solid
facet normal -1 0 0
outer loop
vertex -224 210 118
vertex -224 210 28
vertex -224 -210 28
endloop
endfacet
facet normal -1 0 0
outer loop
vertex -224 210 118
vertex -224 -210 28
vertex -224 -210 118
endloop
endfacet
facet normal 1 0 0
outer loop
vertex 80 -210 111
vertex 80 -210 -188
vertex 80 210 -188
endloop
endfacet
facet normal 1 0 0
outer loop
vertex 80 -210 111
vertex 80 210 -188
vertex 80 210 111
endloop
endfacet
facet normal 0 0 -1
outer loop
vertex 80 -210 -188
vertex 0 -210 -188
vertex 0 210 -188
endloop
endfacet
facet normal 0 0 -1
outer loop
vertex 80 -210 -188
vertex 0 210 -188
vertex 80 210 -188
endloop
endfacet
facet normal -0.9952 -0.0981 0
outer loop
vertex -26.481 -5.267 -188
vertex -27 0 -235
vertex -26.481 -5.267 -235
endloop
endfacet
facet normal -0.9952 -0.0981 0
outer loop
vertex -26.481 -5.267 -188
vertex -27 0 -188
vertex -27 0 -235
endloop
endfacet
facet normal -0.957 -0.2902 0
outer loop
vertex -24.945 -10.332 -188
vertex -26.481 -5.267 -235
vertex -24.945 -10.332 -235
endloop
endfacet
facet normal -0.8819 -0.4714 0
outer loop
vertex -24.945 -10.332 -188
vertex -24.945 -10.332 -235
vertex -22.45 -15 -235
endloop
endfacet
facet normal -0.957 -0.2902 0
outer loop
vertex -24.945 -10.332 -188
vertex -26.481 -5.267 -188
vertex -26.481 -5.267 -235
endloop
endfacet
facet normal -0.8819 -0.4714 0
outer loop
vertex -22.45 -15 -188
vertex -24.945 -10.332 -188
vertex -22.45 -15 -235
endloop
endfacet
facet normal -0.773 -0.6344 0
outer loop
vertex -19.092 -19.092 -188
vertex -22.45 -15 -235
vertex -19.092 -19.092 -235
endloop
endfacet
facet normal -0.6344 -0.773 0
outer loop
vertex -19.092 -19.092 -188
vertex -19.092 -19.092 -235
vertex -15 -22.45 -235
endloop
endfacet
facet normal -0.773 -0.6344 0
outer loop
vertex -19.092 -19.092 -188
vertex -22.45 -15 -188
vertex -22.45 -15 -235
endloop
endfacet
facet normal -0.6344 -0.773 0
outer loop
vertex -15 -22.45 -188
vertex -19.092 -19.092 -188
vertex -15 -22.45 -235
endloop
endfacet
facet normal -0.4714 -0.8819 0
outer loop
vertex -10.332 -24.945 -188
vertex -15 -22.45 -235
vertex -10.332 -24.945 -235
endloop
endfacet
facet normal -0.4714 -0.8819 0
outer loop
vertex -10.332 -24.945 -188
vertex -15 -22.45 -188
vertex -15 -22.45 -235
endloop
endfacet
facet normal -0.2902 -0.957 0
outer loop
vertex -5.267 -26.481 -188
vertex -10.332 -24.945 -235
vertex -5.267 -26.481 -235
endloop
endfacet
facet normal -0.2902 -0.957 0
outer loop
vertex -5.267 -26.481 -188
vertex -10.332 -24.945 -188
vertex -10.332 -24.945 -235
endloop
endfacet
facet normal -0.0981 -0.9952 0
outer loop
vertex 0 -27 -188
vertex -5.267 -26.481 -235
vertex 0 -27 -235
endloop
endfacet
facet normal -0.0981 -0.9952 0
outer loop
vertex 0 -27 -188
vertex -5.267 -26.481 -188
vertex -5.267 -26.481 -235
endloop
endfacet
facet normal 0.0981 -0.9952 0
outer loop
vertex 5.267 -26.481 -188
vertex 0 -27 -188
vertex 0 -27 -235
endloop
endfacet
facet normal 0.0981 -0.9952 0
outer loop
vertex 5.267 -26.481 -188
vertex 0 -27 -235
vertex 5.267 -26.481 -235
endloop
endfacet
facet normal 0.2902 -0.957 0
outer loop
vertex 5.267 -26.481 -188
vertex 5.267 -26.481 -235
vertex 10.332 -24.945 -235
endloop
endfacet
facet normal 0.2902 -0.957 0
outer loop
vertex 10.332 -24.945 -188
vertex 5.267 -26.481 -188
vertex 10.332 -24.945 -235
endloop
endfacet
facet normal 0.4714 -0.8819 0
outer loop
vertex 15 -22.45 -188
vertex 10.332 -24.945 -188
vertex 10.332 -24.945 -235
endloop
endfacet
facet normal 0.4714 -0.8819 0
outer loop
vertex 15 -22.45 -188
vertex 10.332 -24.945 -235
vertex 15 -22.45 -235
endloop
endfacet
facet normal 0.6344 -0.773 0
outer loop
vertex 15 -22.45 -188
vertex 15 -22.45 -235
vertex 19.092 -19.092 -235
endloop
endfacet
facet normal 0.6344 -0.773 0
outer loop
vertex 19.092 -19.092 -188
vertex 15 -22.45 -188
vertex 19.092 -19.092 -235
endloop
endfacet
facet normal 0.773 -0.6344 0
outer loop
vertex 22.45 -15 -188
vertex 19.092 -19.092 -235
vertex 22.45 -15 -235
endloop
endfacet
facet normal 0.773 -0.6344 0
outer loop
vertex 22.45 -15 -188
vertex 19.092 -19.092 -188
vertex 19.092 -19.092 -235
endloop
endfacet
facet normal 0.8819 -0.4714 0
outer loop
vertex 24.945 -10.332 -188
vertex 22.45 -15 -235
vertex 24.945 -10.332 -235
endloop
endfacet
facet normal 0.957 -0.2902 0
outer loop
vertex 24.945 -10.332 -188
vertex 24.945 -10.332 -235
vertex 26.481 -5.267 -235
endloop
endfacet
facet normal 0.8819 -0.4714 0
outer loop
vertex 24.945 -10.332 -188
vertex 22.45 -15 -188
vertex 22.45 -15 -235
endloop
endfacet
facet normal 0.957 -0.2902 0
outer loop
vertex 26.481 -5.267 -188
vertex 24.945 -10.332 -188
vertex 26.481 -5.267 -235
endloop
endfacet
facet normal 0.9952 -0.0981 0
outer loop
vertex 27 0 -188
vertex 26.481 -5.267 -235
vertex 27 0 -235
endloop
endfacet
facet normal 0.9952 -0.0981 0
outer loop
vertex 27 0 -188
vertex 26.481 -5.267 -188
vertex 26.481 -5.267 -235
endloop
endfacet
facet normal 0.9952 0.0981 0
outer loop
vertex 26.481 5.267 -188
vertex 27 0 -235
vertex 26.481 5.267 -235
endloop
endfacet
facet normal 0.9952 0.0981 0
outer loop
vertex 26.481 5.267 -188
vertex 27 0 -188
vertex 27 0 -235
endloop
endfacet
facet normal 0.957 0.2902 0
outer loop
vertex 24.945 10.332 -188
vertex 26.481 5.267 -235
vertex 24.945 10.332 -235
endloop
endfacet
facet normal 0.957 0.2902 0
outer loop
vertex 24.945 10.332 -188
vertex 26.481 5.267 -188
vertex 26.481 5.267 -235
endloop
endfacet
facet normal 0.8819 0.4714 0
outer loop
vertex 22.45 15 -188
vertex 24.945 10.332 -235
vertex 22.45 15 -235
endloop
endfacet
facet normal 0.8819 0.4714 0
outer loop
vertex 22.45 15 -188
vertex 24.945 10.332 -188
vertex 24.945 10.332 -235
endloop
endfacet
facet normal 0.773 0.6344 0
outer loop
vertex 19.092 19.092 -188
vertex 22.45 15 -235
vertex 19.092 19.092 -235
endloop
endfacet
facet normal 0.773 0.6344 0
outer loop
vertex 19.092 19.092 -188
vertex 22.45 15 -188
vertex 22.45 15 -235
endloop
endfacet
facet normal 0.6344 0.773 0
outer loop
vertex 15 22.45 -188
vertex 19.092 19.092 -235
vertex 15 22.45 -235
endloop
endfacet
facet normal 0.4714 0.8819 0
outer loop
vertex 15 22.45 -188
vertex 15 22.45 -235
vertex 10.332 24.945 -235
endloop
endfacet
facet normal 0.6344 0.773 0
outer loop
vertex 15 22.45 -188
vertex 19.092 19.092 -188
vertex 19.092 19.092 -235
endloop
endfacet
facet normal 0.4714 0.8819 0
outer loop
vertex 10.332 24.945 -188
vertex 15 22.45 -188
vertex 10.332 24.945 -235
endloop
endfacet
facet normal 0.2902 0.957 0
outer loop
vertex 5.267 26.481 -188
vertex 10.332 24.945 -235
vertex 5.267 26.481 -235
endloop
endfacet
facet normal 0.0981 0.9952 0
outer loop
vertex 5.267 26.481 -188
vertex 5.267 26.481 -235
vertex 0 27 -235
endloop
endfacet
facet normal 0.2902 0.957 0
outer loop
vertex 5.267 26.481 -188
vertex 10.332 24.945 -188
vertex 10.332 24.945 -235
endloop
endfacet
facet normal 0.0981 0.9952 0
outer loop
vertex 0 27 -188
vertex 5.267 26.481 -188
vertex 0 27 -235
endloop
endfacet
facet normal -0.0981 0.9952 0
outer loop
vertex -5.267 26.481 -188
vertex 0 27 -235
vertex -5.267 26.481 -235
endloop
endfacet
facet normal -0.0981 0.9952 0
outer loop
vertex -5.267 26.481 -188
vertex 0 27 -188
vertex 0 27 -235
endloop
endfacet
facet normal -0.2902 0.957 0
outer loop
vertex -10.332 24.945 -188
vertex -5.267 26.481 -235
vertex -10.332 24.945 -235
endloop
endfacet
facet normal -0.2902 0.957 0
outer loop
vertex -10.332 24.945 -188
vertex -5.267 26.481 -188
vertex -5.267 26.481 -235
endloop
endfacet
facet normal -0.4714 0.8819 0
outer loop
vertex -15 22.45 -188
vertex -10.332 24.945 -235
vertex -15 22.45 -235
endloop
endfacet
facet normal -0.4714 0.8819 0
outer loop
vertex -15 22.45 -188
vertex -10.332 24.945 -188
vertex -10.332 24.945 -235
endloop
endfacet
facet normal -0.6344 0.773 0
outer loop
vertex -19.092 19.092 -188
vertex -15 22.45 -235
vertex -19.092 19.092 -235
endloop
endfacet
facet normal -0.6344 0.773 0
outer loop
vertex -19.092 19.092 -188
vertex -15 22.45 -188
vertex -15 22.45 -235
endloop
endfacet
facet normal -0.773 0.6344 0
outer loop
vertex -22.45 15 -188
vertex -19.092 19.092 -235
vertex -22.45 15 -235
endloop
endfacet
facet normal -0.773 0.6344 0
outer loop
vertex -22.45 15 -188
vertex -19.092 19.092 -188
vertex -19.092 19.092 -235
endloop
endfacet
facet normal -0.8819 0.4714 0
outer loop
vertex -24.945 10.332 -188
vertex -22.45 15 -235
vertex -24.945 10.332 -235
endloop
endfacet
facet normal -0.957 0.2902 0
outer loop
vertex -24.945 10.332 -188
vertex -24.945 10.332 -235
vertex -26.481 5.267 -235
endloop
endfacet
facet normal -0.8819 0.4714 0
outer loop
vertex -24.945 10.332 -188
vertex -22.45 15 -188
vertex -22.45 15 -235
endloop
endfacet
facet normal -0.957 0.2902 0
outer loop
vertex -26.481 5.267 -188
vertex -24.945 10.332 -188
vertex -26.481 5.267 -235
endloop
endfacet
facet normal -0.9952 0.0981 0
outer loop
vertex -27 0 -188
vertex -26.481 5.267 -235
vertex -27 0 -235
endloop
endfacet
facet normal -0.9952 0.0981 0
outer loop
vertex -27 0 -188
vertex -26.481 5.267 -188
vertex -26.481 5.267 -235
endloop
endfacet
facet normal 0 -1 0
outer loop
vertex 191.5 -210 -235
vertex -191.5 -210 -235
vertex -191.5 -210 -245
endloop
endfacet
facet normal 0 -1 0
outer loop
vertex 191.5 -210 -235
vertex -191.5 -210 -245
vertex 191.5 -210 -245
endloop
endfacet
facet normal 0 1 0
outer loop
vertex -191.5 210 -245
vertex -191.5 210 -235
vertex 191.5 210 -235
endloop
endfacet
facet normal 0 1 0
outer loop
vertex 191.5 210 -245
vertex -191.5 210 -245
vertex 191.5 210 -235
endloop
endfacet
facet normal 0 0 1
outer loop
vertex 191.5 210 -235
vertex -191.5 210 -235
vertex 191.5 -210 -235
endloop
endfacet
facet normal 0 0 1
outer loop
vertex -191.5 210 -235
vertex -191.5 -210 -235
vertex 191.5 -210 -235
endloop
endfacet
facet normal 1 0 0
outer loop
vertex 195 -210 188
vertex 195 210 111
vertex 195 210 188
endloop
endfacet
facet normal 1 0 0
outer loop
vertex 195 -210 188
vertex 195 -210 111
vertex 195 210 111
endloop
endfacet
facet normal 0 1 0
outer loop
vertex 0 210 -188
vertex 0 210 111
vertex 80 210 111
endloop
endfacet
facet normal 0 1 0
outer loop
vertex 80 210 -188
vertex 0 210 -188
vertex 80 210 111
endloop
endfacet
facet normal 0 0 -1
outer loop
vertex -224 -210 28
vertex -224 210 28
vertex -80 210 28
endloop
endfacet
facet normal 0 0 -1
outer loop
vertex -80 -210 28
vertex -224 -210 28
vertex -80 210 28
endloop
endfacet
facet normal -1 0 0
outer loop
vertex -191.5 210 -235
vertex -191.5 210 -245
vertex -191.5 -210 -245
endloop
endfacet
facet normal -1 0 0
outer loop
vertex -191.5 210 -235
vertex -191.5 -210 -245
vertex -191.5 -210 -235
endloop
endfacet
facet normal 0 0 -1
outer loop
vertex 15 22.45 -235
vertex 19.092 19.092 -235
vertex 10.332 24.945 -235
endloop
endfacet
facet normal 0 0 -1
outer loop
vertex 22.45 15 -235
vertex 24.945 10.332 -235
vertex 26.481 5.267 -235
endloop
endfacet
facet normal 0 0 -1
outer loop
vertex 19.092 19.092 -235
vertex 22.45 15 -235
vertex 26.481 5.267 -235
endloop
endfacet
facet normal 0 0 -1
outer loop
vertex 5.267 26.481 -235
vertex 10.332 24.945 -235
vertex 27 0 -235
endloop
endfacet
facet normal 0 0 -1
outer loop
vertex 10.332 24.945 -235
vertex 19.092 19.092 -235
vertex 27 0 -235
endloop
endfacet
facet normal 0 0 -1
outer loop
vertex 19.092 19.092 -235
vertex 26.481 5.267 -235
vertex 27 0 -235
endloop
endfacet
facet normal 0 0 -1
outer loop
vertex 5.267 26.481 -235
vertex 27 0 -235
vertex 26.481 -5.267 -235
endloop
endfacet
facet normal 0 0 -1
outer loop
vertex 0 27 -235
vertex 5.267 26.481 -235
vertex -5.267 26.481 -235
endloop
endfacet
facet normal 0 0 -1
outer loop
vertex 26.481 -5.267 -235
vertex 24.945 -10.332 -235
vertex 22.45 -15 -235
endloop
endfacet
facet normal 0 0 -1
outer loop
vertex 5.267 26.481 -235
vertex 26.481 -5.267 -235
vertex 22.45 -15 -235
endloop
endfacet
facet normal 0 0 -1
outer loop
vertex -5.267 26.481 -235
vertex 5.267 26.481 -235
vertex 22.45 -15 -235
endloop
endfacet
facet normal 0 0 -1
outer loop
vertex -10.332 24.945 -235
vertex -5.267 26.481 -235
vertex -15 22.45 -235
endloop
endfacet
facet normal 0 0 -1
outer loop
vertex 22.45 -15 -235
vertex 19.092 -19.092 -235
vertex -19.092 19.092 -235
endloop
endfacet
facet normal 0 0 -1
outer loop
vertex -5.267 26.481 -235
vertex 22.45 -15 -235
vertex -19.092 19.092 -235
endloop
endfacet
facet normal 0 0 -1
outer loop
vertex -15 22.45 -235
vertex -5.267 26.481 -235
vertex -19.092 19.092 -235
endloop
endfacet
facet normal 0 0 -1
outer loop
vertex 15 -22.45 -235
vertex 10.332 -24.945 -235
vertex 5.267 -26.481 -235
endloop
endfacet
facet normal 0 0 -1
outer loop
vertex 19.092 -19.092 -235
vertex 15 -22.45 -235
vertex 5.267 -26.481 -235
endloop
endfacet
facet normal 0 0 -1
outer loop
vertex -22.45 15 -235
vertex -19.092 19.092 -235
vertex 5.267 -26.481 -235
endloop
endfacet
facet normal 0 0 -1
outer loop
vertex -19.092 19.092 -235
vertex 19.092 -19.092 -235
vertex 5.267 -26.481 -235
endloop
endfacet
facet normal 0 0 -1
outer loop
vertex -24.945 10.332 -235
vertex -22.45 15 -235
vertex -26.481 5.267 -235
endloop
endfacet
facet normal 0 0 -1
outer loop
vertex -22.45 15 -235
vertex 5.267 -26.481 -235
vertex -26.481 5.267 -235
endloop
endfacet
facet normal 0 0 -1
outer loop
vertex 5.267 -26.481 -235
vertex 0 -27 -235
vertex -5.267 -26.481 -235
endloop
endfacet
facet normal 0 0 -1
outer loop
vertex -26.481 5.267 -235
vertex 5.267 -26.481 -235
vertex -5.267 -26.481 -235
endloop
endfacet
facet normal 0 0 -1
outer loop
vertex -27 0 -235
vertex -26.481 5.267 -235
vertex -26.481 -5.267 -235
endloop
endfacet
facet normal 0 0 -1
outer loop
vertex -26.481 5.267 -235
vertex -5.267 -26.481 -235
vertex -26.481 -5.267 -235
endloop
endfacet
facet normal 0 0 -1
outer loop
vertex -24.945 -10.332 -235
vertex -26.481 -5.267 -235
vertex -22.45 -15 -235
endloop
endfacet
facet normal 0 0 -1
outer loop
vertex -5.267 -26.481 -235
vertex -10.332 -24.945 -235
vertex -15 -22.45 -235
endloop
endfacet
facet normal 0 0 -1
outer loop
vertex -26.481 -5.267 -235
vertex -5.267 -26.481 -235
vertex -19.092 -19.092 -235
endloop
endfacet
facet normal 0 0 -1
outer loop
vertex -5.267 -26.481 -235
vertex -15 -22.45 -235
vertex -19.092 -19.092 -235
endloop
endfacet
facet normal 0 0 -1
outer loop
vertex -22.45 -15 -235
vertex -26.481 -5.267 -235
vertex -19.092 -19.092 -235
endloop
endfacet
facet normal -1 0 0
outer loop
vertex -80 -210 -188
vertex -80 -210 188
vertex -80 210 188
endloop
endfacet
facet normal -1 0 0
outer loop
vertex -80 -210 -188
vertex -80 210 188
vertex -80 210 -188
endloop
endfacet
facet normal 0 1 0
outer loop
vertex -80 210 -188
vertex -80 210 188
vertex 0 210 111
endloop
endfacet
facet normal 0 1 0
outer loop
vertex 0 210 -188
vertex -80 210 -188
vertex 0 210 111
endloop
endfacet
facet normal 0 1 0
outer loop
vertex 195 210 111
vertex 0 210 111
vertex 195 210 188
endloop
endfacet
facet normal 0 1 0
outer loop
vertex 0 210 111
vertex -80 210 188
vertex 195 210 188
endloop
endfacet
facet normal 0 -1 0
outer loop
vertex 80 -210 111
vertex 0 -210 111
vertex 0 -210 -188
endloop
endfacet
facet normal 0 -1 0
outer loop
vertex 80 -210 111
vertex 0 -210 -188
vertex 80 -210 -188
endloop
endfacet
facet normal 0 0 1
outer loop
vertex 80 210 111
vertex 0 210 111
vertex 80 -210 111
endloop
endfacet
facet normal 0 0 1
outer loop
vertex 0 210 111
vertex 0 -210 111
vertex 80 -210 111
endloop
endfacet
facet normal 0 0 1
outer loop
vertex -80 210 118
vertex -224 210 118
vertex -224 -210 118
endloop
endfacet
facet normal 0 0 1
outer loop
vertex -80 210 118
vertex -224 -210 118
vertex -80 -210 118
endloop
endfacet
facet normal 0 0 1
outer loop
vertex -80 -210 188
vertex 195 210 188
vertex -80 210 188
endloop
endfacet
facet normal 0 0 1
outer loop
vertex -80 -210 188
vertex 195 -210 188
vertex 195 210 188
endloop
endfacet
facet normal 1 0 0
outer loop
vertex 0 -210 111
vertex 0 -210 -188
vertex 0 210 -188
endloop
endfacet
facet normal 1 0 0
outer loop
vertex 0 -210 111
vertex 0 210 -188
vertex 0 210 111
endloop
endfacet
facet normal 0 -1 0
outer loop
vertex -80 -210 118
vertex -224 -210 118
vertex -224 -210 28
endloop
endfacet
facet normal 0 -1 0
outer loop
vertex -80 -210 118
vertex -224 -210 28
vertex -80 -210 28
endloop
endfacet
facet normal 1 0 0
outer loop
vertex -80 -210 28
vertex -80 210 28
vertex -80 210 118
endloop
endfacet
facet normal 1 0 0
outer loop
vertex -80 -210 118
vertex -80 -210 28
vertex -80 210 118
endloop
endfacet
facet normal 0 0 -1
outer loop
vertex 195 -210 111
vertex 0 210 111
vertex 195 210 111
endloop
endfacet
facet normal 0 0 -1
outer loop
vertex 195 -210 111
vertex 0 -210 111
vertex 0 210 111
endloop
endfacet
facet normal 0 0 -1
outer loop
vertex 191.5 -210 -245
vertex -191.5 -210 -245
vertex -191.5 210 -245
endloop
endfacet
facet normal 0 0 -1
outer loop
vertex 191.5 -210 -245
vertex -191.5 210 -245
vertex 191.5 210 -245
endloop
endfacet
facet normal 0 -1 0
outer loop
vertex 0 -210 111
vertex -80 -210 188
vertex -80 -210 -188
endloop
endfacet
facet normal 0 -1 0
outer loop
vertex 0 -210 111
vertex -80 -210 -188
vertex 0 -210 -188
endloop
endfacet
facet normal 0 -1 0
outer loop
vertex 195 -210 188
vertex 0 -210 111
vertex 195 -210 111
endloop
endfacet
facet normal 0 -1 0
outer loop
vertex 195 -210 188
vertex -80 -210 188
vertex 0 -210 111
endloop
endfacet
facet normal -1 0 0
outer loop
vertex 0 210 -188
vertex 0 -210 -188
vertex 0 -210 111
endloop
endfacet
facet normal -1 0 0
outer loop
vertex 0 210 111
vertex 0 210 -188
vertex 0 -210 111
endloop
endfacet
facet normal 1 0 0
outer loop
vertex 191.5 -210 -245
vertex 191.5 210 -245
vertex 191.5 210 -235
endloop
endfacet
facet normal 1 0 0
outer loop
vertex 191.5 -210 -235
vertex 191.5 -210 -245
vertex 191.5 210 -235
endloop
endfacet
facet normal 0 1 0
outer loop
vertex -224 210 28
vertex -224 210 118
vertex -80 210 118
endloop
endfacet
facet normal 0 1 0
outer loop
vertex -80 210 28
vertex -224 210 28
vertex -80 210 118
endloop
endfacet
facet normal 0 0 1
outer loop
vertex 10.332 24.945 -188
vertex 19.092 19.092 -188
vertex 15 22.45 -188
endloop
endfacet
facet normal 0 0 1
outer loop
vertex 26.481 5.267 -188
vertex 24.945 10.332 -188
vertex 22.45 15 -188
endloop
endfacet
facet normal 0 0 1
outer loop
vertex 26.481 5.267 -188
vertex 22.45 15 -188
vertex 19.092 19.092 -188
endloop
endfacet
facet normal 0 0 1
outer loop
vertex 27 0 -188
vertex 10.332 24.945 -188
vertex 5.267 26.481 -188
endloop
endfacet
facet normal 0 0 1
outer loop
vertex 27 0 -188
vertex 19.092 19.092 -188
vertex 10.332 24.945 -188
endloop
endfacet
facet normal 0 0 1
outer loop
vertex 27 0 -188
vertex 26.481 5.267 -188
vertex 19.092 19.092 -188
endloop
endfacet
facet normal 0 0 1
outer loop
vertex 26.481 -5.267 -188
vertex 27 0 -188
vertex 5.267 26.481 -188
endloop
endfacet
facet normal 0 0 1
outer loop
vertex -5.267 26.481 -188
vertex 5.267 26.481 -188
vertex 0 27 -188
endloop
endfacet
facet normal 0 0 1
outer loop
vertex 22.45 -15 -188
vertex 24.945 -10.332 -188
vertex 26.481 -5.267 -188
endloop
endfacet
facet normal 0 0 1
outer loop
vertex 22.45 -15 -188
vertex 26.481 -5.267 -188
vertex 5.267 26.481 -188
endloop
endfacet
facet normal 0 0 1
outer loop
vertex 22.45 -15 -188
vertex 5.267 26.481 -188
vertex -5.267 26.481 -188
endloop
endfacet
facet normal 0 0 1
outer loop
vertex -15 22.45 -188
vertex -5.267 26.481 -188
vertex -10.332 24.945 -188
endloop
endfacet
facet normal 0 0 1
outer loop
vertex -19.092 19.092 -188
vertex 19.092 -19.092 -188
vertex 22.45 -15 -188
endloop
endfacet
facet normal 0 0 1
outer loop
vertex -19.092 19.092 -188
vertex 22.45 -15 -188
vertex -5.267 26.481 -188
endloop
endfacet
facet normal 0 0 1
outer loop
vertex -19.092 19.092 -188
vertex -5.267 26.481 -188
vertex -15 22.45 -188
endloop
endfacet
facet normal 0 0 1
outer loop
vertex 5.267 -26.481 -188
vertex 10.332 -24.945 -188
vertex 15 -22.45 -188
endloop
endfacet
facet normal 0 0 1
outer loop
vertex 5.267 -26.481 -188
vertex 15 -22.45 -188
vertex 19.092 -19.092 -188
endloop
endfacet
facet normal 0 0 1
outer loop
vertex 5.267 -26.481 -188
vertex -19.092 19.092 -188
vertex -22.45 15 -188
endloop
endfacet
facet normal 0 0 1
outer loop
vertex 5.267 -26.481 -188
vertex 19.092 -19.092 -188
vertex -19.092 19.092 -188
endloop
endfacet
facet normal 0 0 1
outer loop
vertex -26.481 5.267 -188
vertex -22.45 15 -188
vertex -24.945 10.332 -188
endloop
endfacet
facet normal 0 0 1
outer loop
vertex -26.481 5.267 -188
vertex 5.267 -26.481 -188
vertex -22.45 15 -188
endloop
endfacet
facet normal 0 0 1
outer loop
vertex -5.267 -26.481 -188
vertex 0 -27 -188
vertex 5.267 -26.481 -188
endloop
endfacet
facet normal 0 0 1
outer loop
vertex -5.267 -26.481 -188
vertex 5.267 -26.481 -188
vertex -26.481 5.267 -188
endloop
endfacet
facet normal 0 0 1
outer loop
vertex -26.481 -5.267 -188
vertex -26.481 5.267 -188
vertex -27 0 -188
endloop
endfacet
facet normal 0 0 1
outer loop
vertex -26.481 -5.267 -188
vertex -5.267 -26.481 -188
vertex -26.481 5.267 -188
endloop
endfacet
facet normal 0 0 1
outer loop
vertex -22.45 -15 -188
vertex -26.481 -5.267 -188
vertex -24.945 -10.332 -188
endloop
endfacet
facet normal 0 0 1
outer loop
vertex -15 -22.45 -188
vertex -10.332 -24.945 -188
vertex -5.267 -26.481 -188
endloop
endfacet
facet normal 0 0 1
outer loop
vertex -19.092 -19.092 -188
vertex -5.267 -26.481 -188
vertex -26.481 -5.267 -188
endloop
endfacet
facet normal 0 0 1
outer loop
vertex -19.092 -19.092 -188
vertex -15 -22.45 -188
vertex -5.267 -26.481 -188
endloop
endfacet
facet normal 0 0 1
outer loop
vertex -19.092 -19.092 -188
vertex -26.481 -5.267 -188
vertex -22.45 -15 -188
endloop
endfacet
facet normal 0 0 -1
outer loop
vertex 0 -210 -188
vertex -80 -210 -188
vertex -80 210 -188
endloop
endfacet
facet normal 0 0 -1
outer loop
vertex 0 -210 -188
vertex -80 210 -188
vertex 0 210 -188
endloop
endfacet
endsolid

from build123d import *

# Parameters (mm, degrees)
F2_DEPTH      = 210
F2_DEPTH_BACK = 210
F1_W          = 80
F1_H          = 299
F3_DEPTH      = 210
F3_DEPTH_BACK = 210
F1_W_2        = 144
F1_H_2        = 90
F4_W          = 27
F4_H          = 47
F5_W          = 383
F5_H          = 10
F7_DEPTH      = 210
F7_DEPTH_BACK = 210


with BuildPart() as f2:
    # F0 (on Front) → F2 (new body, two sides)
    with BuildSketch(Plane.XZ) as f2_sk:
        Polygon((195, 188), (-80, 188), (-80, -188), (0, -188), (0, 111), (195, 111), align=None)
    extrude(amount=F2_DEPTH)
    extrude(f2_sk.sketch, amount=-F2_DEPTH_BACK)


with BuildPart() as f3:
    # F1 (on Front) → F3 (new body, two sides)
    with BuildSketch(Plane.XZ) as f3_sk:
        with Locations((40, -38.5)):
            Rectangle(F1_W, F1_H)
    extrude(amount=F3_DEPTH)
    extrude(f3_sk.sketch, amount=-F3_DEPTH_BACK)


with BuildPart() as f3b:
    # F1 (on Front) → F3, piece 2 (new body, two sides)
    with BuildSketch(Plane.XZ) as f3_2_sk:
        with Locations((-152, 73)):
            Rectangle(F1_W_2, F1_H_2)
    extrude(amount=F3_DEPTH)
    extrude(f3_2_sk.sketch, amount=-F3_DEPTH_BACK)


with BuildPart() as f6:
    # F4 (on Front) → F6 (revolve)
    with BuildSketch(Plane.XZ):
        with Locations((-13.5, -211.5)):
            Rectangle(F4_W, F4_H)
    revolve(axis=Axis((0, 0, -211.5), (0, 0, 1)))


with BuildPart() as f7:
    # F5 (on Front) → F7 (new body, two sides)
    with BuildSketch(Plane.XZ) as f7_sk:
        with Locations((0, -240)):
            Rectangle(F5_W, F5_H)
    extrude(amount=F7_DEPTH)
    extrude(f7_sk.sketch, amount=-F7_DEPTH_BACK)


solid = Compound([f2.part, f3.part, f3b.part, f6.part, f7.part])
